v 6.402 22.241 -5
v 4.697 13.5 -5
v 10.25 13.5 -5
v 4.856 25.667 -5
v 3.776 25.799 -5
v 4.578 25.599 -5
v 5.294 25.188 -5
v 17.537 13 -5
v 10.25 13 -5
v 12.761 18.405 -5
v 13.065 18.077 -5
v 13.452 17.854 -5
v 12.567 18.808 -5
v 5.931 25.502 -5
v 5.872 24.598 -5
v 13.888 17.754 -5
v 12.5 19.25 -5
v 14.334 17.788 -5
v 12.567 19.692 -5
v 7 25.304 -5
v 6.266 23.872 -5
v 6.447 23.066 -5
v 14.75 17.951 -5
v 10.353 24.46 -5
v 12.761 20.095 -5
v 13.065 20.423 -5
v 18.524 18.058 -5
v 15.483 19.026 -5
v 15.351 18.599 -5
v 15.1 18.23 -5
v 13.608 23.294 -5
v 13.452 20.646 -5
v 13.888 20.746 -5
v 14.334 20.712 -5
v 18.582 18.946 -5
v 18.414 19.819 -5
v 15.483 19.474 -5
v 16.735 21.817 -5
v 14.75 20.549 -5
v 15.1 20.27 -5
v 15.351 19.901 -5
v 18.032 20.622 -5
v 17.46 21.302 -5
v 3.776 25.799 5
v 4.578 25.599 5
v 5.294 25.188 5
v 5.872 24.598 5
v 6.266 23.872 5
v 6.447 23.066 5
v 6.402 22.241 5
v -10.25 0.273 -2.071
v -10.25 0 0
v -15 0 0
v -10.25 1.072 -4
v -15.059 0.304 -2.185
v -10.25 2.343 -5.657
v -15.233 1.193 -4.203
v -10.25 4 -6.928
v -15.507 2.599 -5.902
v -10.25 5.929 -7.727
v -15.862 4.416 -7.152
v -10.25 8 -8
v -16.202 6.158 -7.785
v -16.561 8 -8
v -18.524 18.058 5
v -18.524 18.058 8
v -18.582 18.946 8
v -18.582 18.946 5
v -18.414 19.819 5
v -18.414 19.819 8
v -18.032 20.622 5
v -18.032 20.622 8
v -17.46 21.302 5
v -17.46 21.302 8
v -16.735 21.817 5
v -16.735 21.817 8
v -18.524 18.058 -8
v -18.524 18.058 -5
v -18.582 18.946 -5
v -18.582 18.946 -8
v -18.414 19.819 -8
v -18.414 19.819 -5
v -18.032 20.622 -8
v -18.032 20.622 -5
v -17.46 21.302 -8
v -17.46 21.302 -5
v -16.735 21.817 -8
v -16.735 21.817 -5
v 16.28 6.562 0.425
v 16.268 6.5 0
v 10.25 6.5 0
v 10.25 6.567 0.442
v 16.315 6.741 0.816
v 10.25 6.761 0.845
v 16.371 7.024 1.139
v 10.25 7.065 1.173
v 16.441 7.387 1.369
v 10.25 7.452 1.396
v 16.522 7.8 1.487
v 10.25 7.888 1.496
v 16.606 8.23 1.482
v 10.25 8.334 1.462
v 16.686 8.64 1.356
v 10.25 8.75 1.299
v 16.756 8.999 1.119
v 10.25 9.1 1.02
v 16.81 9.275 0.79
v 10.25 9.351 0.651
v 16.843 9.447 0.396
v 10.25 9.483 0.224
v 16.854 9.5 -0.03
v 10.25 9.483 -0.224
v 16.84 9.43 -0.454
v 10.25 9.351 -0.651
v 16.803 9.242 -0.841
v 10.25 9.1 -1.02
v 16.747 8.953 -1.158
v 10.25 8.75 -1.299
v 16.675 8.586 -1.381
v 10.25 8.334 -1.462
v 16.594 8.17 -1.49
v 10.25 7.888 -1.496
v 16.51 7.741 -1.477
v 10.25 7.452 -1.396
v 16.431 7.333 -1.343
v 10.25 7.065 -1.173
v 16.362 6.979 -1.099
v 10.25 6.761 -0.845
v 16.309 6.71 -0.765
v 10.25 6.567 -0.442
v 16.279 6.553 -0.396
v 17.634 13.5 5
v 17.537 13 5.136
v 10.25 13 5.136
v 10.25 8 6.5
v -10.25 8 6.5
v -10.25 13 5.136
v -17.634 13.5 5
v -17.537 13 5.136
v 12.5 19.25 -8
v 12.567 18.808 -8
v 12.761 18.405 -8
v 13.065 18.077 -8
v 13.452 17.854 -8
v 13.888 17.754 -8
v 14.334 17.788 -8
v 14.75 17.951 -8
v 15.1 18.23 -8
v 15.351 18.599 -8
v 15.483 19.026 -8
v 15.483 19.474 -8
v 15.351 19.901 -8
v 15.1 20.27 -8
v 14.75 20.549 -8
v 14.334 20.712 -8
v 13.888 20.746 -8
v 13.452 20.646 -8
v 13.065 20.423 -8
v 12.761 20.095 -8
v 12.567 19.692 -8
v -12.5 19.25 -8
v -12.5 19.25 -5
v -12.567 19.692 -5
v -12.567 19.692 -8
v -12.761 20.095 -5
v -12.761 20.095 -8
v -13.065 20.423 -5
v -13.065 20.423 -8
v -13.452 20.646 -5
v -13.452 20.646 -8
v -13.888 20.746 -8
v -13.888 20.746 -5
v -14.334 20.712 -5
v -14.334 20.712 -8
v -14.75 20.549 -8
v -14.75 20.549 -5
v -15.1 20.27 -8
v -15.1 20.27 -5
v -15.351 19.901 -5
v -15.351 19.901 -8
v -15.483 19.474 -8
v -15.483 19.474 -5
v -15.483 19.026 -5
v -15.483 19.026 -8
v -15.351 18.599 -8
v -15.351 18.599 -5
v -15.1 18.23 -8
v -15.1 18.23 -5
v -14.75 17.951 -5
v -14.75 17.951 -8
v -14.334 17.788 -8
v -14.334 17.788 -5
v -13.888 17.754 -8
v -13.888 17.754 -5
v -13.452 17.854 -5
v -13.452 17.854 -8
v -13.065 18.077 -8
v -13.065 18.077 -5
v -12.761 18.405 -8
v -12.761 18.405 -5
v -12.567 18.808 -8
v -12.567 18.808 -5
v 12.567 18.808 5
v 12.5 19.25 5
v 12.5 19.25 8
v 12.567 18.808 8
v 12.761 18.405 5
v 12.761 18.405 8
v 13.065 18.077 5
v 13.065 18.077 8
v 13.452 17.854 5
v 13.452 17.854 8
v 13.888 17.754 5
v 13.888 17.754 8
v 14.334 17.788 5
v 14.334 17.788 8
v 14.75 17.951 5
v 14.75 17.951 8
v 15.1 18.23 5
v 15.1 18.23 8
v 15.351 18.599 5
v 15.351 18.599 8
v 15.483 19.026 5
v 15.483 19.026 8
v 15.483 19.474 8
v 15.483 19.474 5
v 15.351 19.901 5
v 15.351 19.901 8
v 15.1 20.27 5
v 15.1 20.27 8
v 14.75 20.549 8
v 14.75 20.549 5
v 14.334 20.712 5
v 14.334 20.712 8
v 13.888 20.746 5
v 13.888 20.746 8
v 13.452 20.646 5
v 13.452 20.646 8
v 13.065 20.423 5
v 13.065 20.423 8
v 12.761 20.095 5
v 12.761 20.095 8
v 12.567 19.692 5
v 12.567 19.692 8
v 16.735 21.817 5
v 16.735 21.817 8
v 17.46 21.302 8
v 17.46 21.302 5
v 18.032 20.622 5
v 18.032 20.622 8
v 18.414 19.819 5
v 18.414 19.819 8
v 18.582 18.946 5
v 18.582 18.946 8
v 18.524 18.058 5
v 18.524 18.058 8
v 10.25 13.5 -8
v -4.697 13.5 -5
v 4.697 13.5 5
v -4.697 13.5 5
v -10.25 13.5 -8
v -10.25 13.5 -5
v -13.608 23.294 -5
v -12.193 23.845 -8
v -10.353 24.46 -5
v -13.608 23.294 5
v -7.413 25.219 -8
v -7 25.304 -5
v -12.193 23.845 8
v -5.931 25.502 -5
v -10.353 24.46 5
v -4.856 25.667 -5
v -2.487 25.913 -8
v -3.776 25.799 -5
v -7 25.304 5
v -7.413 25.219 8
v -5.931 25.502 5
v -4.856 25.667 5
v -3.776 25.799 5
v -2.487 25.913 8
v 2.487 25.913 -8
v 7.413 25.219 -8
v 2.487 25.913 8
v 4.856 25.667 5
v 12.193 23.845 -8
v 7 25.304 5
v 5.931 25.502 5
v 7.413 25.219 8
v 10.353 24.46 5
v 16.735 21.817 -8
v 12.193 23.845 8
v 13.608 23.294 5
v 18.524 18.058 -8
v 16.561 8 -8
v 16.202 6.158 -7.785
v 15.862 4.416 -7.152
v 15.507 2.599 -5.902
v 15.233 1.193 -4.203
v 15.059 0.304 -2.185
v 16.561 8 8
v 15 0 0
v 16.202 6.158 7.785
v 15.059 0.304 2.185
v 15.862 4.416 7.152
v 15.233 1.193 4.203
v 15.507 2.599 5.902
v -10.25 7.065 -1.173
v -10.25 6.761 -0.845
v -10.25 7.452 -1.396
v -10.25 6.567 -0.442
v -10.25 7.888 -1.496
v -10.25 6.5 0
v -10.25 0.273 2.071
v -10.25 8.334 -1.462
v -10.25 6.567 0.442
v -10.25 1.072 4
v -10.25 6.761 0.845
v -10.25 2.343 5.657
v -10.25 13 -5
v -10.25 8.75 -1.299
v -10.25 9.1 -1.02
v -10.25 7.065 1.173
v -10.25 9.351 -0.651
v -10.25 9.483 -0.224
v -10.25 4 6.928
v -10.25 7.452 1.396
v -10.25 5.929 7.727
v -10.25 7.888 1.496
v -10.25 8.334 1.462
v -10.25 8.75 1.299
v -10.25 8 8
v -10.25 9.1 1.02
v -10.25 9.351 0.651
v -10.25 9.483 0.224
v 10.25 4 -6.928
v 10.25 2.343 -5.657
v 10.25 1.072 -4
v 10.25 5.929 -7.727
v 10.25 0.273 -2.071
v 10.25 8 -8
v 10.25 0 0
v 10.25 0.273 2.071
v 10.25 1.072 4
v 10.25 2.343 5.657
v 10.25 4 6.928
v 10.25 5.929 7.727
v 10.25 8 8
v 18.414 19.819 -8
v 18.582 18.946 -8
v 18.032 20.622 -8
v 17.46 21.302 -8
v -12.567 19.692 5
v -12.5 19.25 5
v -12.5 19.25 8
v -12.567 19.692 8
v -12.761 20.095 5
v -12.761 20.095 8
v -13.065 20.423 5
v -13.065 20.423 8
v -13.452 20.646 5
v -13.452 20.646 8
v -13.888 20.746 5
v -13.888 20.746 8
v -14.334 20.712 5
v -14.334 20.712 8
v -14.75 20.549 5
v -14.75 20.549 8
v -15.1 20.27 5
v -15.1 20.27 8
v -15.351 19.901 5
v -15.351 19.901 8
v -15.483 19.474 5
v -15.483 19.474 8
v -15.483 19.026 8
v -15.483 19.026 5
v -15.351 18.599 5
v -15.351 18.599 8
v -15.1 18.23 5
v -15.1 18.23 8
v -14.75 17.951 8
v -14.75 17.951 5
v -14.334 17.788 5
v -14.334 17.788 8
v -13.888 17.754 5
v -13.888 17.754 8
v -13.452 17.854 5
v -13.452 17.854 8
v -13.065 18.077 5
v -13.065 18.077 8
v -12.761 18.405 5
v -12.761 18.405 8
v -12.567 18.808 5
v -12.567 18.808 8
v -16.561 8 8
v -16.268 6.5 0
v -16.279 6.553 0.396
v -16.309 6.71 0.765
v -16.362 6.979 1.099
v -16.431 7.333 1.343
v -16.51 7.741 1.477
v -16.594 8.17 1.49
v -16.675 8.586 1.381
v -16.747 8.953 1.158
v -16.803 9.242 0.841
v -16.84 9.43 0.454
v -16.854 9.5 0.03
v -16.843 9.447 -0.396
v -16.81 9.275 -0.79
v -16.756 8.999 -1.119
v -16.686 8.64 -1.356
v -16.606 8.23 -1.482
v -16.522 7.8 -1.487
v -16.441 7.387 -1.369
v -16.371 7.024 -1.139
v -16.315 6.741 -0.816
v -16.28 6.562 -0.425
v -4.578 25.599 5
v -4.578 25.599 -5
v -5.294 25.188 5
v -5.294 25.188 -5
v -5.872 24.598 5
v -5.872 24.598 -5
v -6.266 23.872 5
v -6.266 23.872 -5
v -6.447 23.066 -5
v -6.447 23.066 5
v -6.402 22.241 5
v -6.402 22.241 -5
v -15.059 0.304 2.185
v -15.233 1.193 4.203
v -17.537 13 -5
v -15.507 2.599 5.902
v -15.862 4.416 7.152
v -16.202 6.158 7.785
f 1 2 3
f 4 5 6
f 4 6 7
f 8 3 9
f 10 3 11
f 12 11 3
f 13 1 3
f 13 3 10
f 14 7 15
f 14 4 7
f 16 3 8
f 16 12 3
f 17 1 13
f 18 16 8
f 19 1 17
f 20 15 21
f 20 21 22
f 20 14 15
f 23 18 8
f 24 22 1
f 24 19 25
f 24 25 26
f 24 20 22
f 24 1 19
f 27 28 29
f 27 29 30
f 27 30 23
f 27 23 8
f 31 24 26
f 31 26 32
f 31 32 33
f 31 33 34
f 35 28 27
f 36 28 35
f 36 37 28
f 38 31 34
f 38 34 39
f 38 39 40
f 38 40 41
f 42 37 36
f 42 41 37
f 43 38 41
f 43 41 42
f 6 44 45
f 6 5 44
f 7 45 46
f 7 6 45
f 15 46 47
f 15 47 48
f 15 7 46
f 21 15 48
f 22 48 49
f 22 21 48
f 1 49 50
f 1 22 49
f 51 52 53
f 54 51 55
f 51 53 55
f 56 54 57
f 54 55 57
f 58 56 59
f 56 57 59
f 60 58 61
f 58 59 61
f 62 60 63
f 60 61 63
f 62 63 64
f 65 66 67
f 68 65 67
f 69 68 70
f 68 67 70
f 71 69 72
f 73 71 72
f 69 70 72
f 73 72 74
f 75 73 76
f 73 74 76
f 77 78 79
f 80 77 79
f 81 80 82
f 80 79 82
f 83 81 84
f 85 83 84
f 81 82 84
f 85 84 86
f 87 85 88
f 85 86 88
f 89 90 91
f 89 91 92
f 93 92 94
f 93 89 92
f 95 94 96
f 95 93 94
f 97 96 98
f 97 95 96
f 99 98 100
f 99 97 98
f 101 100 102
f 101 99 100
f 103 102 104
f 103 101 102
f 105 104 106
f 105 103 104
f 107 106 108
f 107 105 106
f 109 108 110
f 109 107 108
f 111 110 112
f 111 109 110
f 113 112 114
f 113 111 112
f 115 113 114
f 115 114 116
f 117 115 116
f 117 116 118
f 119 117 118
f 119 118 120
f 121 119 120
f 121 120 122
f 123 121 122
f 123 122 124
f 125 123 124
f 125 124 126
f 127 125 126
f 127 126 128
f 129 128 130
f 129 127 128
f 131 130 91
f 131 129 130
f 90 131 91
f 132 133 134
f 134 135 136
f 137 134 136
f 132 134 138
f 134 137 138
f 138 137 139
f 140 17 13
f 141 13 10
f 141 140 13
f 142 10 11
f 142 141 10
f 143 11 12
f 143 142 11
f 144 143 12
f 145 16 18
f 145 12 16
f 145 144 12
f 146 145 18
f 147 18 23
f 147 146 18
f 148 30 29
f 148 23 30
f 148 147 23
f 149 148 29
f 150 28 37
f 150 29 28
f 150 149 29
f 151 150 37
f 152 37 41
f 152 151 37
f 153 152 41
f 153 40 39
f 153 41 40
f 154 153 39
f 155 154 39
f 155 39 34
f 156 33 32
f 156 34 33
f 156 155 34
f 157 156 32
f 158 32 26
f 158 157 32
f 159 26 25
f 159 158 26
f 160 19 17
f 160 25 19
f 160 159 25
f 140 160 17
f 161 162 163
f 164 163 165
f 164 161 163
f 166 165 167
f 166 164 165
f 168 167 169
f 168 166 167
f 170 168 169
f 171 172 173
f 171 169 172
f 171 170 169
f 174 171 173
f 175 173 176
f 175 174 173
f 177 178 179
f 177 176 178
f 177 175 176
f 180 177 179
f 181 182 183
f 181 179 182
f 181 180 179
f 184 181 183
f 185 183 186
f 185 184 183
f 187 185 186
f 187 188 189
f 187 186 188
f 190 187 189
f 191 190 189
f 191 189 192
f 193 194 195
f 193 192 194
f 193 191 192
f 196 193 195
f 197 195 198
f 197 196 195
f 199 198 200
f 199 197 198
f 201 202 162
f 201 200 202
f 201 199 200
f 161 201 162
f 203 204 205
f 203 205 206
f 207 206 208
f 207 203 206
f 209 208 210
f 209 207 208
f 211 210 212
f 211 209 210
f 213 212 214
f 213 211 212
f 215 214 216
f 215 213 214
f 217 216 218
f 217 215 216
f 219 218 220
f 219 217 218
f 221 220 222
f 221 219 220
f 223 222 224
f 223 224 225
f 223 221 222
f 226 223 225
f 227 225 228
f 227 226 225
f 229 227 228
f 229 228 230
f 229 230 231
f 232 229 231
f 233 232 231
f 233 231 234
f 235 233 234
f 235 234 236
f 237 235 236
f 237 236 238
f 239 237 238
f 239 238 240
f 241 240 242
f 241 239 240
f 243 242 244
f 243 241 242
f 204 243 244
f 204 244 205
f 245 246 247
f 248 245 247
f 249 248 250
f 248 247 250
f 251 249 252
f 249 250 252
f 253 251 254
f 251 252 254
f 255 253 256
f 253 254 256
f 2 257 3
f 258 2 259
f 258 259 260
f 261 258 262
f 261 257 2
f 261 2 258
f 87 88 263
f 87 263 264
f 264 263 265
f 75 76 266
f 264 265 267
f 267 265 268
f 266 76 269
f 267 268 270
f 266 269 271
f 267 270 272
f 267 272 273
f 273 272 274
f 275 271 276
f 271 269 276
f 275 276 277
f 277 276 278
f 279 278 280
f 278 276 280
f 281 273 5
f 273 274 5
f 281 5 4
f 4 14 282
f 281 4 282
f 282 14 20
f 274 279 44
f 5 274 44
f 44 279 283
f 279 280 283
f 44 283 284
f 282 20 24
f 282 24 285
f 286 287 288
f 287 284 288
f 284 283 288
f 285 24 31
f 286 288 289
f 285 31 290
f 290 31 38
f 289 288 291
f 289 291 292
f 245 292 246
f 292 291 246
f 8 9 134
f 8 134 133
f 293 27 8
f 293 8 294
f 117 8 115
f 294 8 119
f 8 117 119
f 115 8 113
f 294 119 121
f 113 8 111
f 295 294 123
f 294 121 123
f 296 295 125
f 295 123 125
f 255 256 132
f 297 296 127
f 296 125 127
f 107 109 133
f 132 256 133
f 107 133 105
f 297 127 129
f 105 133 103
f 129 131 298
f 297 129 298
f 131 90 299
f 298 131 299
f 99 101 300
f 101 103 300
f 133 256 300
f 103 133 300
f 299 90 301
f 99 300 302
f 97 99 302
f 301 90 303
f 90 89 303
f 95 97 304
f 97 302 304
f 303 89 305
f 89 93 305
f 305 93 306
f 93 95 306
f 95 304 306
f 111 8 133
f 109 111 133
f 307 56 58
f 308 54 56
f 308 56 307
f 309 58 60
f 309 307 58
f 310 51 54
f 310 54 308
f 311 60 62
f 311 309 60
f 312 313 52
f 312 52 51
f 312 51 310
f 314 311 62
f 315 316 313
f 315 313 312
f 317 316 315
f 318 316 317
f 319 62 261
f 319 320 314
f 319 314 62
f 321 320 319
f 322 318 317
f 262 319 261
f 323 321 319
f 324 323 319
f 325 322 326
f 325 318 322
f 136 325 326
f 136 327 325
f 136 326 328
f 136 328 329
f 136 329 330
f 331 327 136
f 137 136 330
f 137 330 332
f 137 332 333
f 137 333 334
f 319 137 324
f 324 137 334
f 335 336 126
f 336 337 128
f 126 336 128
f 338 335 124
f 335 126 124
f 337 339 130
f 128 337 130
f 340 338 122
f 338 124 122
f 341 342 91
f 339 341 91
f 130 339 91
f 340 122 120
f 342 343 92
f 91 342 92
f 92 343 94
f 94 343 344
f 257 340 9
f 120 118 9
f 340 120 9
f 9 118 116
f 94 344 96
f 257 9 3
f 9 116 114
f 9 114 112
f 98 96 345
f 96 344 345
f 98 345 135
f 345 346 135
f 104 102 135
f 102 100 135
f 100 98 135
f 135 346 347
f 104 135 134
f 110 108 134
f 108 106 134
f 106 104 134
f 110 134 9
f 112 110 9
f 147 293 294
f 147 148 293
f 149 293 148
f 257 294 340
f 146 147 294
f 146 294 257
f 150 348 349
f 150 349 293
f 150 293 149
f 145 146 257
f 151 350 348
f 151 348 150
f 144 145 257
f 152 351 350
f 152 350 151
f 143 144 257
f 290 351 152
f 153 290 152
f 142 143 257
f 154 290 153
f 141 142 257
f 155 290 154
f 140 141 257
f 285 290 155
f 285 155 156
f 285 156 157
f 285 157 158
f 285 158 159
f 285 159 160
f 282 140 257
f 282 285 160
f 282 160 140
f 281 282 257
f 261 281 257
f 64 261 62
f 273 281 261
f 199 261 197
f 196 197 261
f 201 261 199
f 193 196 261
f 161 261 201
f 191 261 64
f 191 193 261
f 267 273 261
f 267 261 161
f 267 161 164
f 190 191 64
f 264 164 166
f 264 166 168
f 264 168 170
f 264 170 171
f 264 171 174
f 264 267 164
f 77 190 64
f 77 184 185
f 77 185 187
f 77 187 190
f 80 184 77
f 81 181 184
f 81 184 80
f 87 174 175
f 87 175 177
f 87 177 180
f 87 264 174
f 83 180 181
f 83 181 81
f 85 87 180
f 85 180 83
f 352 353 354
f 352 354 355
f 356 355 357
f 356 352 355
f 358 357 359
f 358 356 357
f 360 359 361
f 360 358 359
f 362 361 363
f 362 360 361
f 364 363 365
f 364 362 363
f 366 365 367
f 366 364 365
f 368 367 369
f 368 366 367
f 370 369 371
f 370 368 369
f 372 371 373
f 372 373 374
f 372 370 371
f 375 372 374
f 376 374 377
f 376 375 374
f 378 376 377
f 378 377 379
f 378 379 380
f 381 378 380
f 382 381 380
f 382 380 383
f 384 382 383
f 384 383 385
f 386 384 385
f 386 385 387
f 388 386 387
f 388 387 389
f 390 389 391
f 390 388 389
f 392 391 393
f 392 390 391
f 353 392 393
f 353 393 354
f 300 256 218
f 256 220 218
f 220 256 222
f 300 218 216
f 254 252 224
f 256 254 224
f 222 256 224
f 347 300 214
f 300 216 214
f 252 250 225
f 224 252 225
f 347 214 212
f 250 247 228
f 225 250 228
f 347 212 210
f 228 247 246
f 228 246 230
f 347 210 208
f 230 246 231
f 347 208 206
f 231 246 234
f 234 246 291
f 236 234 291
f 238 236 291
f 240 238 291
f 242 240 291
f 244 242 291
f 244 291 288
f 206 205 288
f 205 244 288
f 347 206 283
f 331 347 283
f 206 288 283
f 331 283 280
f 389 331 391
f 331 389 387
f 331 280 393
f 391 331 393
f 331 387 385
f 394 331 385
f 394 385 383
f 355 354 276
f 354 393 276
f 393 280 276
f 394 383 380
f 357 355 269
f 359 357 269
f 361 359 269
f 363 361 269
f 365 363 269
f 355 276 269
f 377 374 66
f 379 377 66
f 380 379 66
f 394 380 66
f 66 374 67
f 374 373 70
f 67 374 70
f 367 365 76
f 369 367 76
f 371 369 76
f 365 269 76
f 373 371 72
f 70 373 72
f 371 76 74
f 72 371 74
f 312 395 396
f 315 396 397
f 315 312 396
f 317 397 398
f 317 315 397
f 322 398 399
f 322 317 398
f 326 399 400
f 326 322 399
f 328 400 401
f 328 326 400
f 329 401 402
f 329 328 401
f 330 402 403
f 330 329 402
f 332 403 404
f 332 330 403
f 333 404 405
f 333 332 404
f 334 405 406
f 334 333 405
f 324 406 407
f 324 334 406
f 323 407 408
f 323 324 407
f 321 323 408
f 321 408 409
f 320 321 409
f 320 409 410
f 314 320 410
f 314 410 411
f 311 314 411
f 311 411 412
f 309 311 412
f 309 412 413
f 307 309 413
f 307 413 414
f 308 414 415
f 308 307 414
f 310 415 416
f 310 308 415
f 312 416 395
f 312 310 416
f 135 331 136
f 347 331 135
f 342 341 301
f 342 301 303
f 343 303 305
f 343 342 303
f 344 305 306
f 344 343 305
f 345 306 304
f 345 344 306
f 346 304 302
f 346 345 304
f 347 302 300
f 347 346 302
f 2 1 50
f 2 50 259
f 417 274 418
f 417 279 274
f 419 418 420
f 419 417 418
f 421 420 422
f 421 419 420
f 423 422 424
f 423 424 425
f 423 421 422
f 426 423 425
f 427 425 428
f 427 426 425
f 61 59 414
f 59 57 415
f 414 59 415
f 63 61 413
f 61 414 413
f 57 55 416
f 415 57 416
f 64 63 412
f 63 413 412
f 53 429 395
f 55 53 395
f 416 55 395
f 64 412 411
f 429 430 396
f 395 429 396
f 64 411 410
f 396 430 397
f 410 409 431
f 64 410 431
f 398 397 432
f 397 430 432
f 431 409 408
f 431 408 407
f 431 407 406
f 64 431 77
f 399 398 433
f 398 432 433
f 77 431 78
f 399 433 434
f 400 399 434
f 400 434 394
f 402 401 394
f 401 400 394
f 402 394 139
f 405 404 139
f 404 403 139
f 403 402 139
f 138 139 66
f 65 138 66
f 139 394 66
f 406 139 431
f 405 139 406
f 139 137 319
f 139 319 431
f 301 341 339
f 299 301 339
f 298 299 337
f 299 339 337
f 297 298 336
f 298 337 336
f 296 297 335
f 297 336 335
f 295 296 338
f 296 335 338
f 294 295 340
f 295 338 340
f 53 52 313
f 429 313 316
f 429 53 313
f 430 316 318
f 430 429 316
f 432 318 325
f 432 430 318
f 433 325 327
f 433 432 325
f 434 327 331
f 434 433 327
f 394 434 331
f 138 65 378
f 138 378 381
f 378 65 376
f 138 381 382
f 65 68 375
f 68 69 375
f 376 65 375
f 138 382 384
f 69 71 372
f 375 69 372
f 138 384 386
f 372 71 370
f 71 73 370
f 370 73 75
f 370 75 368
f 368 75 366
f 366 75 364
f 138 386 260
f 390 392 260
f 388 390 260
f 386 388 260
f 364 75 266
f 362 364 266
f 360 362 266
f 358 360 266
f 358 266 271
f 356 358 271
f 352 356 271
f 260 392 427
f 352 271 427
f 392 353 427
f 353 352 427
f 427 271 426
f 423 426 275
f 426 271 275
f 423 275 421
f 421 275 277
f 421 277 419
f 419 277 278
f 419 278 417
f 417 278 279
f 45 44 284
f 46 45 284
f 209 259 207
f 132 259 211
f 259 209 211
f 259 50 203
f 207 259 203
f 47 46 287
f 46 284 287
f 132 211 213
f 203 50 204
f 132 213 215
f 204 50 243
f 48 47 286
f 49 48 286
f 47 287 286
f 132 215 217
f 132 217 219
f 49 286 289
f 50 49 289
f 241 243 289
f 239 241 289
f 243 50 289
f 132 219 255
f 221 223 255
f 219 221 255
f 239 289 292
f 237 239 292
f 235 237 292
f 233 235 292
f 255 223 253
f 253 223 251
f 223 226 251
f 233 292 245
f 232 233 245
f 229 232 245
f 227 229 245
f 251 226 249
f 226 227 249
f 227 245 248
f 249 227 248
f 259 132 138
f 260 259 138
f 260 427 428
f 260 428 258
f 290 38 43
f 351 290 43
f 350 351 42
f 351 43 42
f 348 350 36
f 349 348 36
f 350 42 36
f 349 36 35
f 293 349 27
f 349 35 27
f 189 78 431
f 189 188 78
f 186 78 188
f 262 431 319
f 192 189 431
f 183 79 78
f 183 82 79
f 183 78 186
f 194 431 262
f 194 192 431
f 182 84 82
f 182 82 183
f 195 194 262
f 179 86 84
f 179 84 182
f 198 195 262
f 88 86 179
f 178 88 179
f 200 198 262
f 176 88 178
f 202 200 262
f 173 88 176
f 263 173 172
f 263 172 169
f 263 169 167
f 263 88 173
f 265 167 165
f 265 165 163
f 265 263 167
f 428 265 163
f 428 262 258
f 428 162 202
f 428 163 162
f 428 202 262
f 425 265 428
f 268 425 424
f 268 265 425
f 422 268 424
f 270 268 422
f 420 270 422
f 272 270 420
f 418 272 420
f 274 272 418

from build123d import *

# Parameters (mm, degrees)
ESQUISSE1_R                  = 1.5
BOSS_EXTRU_1_DEPTH           = 8
CONG_1_R                     = 8
ESQUISSE2_W                  = 20.5
ESQUISSE2_H                  = 8.937448888
ENL_V_MAT_EXTRU_1_DEPTH      = 10
ENL_V_MAT_EXTRU_2_DEPTH      = 5
ESQUISSE4_W                  = 5.650854606
ESQUISSE4_H                  = 10
ENL_V_MAT_EXTRU_3_DEPTH      = 5
ENL_V_MAT_EXTRU_4_DEPTH      = 40.644055588
ENL_V_MAT_EXTRU_4_DEPTH_BACK = 40.644055588
ESQUISSE6_R                  = 1.5
ENL_V_MAT_EXTRU_5_REACH      = 37.743
ESQUISSE7_W                  = 20.5
ESQUISSE7_H                  = 5.5
CHANFREIN1_SIZE2             = 1.5
CHANFREIN1_SIZE              = 5.5
CONG_2_R                     = 3


with BuildPart() as part:
    # Esquisse1 → Boss.-Extru.1 (new, symmetric)
    with BuildSketch(Plane.XY):
        with BuildLine():
            Line((15, 0), (-15, 0))
            Line((-15, 0), (-18.52357943, 18.05834458))
            ThreePointArc((-18.52357943, 18.05834458), (-18.248833113, 20.232434219), (-16.735143225, 21.817014359))
            ThreePointArc((-16.735143225, 21.817014359), (0, 26), (16.735143225, 21.817014359))
            ThreePointArc((16.735143225, 21.817014359), (18.248833113, 20.232434219), (18.52357943, 18.05834458))
            Line((18.52357943, 18.05834458), (15, 0))
        make_face()
        with Locations((-14, 19.25)):
            Circle(ESQUISSE1_R, mode=Mode.SUBTRACT)
        with Locations(Location((14, 19.25, 0), (0, 0, 180))):
            Circle(ESQUISSE1_R, mode=Mode.SUBTRACT)
    extrude(amount=BOSS_EXTRU_1_DEPTH, both=True)

    # Congé1
    cong_1_edges = [part.edges().sort_by_distance(p)[0] for p in [
        (0, 0, -8),
        (0, 0, 8),
    ]]
    fillet(cong_1_edges, radius=CONG_1_R - 0.0001)  # a hair under: the kernel refuses the full size

    # Esquisse2 → Enlèv. mat.-Extru.1 (cut, symmetric)
    with BuildSketch(Plane.XY):
        with Locations((0, 3.531275556)):
            Rectangle(ESQUISSE2_W, ESQUISSE2_H)
    extrude(amount=ENL_V_MAT_EXTRU_1_DEPTH, both=True, mode=Mode.SUBTRACT)

    # Esquisse3 → Enlèv. mat.-Extru.2 (cut, symmetric)
    with BuildSketch(Plane.XY):
        with BuildLine():
            Line((7, 25.304379858), (4.599145394, 13))
            Line((4.599145394, 13), (17.536585366, 13))
            Line((17.536585366, 13), (18.52357943, 18.05834458))
            ThreePointArc((18.52357943, 18.05834458), (18.248833113, 20.232434219), (16.735143225, 21.817014359))
            ThreePointArc((16.735143225, 21.817014359), (11.994985849, 23.916379883), (7, 25.304379858))
        make_face()
        with BuildLine():
            Line((-17.536585366, 13), (-18.52357943, 18.05834458))
            ThreePointArc((-18.52357943, 18.05834458), (-18.248833113, 20.232434219), (-16.735143225, 21.817014359))
            ThreePointArc((-16.735143225, 21.817014359), (-11.994985849, 23.916379883), (-7, 25.304379858))
            Line((-7, 25.304379858), (-4.599145394, 13))
            Line((-4.599145394, 13), (-17.536585366, 13))
        make_face()
    extrude(amount=ENL_V_MAT_EXTRU_2_DEPTH, both=True, mode=Mode.SUBTRACT)

    # Esquisse4 → Enlèv. mat.-Extru.3 (cut)
    with BuildSketch(Plane(origin=(0, 13, 0), x_dir=(1, 0, 0), z_dir=(0, 1, 0))):
        with Locations((7.424572697, 0)):
            Rectangle(ESQUISSE4_W, ESQUISSE4_H)
        with Locations((-7.424572697, 0)):
            Rectangle(ESQUISSE4_W, ESQUISSE4_H)
    extrude(amount=-ENL_V_MAT_EXTRU_3_DEPTH, mode=Mode.SUBTRACT)

    # Esquisse6 → Enlèv. mat.-Extru.4 (cut, two sides: drawn at the far end of the back side and taken through both)
    with BuildSketch(Plane.ZY.offset(-10.25).offset(-ENL_V_MAT_EXTRU_4_DEPTH_BACK)):
        with Locations(Location((0, 8, 0), (0, 0, 270))):
            Circle(ESQUISSE6_R)
    extrude(amount=ENL_V_MAT_EXTRU_4_DEPTH + ENL_V_MAT_EXTRU_4_DEPTH_BACK, mode=Mode.SUBTRACT)

    # Enlèv. mat.-Extru.5: up to this face of the body (flat: up to its plane)
    enl_v_mat_extru_5_end = Plane(part.part.faces().sort_by_distance((10.657947806, 16.753093671, 5))[0])
    # Esquisse7 → Enlèv. mat.-Extru.5 (cut, up to the picked face)
    with BuildSketch(Plane(origin=(0, 0, -8), x_dir=(-1, 0, 0), z_dir=(0, 0, -1)), mode=Mode.PRIVATE) as enl_v_mat_extru_5_sk1:
        with Locations((0, 10.75)):
            Rectangle(ESQUISSE7_W, ESQUISSE7_H)
    enl_v_mat_extru_5_tool1 = split(extrude(enl_v_mat_extru_5_sk1.sketch, amount=-ENL_V_MAT_EXTRU_5_REACH, mode=Mode.PRIVATE), bisect_by=enl_v_mat_extru_5_end, keep=Keep.BOTH, mode=Mode.PRIVATE)
    add(enl_v_mat_extru_5_tool1.solids().sort_by(Axis((0, 10.75, -8), (0, 0, 1)))[0], mode=Mode.SUBTRACT)

    # Chanfrein1
    chanfrein1_edges = [part.edges().sort_by_distance(p)[0] for p in [
        (0, 8, 5),
    ]]
    chanfrein1_side = [part.faces().sort_by_distance(p)[0] for p in [
        (0, 8.03, 5),
    ]]
    chamfer(chanfrein1_edges, length=CHANFREIN1_SIZE - 0.0001, length2=CHANFREIN1_SIZE2 - 0.0001, reference=chanfrein1_side[0])  # a hair under: the kernel refuses the full size

    # Congé2
    cong_2_edges = [part.edges().sort_by_distance(p)[0] for p in [
        (7, 25.304379858, 0),
        (-7, 25.304379858, 0),
    ]]
    fillet(cong_2_edges, radius=CONG_2_R)


solid = part.part
